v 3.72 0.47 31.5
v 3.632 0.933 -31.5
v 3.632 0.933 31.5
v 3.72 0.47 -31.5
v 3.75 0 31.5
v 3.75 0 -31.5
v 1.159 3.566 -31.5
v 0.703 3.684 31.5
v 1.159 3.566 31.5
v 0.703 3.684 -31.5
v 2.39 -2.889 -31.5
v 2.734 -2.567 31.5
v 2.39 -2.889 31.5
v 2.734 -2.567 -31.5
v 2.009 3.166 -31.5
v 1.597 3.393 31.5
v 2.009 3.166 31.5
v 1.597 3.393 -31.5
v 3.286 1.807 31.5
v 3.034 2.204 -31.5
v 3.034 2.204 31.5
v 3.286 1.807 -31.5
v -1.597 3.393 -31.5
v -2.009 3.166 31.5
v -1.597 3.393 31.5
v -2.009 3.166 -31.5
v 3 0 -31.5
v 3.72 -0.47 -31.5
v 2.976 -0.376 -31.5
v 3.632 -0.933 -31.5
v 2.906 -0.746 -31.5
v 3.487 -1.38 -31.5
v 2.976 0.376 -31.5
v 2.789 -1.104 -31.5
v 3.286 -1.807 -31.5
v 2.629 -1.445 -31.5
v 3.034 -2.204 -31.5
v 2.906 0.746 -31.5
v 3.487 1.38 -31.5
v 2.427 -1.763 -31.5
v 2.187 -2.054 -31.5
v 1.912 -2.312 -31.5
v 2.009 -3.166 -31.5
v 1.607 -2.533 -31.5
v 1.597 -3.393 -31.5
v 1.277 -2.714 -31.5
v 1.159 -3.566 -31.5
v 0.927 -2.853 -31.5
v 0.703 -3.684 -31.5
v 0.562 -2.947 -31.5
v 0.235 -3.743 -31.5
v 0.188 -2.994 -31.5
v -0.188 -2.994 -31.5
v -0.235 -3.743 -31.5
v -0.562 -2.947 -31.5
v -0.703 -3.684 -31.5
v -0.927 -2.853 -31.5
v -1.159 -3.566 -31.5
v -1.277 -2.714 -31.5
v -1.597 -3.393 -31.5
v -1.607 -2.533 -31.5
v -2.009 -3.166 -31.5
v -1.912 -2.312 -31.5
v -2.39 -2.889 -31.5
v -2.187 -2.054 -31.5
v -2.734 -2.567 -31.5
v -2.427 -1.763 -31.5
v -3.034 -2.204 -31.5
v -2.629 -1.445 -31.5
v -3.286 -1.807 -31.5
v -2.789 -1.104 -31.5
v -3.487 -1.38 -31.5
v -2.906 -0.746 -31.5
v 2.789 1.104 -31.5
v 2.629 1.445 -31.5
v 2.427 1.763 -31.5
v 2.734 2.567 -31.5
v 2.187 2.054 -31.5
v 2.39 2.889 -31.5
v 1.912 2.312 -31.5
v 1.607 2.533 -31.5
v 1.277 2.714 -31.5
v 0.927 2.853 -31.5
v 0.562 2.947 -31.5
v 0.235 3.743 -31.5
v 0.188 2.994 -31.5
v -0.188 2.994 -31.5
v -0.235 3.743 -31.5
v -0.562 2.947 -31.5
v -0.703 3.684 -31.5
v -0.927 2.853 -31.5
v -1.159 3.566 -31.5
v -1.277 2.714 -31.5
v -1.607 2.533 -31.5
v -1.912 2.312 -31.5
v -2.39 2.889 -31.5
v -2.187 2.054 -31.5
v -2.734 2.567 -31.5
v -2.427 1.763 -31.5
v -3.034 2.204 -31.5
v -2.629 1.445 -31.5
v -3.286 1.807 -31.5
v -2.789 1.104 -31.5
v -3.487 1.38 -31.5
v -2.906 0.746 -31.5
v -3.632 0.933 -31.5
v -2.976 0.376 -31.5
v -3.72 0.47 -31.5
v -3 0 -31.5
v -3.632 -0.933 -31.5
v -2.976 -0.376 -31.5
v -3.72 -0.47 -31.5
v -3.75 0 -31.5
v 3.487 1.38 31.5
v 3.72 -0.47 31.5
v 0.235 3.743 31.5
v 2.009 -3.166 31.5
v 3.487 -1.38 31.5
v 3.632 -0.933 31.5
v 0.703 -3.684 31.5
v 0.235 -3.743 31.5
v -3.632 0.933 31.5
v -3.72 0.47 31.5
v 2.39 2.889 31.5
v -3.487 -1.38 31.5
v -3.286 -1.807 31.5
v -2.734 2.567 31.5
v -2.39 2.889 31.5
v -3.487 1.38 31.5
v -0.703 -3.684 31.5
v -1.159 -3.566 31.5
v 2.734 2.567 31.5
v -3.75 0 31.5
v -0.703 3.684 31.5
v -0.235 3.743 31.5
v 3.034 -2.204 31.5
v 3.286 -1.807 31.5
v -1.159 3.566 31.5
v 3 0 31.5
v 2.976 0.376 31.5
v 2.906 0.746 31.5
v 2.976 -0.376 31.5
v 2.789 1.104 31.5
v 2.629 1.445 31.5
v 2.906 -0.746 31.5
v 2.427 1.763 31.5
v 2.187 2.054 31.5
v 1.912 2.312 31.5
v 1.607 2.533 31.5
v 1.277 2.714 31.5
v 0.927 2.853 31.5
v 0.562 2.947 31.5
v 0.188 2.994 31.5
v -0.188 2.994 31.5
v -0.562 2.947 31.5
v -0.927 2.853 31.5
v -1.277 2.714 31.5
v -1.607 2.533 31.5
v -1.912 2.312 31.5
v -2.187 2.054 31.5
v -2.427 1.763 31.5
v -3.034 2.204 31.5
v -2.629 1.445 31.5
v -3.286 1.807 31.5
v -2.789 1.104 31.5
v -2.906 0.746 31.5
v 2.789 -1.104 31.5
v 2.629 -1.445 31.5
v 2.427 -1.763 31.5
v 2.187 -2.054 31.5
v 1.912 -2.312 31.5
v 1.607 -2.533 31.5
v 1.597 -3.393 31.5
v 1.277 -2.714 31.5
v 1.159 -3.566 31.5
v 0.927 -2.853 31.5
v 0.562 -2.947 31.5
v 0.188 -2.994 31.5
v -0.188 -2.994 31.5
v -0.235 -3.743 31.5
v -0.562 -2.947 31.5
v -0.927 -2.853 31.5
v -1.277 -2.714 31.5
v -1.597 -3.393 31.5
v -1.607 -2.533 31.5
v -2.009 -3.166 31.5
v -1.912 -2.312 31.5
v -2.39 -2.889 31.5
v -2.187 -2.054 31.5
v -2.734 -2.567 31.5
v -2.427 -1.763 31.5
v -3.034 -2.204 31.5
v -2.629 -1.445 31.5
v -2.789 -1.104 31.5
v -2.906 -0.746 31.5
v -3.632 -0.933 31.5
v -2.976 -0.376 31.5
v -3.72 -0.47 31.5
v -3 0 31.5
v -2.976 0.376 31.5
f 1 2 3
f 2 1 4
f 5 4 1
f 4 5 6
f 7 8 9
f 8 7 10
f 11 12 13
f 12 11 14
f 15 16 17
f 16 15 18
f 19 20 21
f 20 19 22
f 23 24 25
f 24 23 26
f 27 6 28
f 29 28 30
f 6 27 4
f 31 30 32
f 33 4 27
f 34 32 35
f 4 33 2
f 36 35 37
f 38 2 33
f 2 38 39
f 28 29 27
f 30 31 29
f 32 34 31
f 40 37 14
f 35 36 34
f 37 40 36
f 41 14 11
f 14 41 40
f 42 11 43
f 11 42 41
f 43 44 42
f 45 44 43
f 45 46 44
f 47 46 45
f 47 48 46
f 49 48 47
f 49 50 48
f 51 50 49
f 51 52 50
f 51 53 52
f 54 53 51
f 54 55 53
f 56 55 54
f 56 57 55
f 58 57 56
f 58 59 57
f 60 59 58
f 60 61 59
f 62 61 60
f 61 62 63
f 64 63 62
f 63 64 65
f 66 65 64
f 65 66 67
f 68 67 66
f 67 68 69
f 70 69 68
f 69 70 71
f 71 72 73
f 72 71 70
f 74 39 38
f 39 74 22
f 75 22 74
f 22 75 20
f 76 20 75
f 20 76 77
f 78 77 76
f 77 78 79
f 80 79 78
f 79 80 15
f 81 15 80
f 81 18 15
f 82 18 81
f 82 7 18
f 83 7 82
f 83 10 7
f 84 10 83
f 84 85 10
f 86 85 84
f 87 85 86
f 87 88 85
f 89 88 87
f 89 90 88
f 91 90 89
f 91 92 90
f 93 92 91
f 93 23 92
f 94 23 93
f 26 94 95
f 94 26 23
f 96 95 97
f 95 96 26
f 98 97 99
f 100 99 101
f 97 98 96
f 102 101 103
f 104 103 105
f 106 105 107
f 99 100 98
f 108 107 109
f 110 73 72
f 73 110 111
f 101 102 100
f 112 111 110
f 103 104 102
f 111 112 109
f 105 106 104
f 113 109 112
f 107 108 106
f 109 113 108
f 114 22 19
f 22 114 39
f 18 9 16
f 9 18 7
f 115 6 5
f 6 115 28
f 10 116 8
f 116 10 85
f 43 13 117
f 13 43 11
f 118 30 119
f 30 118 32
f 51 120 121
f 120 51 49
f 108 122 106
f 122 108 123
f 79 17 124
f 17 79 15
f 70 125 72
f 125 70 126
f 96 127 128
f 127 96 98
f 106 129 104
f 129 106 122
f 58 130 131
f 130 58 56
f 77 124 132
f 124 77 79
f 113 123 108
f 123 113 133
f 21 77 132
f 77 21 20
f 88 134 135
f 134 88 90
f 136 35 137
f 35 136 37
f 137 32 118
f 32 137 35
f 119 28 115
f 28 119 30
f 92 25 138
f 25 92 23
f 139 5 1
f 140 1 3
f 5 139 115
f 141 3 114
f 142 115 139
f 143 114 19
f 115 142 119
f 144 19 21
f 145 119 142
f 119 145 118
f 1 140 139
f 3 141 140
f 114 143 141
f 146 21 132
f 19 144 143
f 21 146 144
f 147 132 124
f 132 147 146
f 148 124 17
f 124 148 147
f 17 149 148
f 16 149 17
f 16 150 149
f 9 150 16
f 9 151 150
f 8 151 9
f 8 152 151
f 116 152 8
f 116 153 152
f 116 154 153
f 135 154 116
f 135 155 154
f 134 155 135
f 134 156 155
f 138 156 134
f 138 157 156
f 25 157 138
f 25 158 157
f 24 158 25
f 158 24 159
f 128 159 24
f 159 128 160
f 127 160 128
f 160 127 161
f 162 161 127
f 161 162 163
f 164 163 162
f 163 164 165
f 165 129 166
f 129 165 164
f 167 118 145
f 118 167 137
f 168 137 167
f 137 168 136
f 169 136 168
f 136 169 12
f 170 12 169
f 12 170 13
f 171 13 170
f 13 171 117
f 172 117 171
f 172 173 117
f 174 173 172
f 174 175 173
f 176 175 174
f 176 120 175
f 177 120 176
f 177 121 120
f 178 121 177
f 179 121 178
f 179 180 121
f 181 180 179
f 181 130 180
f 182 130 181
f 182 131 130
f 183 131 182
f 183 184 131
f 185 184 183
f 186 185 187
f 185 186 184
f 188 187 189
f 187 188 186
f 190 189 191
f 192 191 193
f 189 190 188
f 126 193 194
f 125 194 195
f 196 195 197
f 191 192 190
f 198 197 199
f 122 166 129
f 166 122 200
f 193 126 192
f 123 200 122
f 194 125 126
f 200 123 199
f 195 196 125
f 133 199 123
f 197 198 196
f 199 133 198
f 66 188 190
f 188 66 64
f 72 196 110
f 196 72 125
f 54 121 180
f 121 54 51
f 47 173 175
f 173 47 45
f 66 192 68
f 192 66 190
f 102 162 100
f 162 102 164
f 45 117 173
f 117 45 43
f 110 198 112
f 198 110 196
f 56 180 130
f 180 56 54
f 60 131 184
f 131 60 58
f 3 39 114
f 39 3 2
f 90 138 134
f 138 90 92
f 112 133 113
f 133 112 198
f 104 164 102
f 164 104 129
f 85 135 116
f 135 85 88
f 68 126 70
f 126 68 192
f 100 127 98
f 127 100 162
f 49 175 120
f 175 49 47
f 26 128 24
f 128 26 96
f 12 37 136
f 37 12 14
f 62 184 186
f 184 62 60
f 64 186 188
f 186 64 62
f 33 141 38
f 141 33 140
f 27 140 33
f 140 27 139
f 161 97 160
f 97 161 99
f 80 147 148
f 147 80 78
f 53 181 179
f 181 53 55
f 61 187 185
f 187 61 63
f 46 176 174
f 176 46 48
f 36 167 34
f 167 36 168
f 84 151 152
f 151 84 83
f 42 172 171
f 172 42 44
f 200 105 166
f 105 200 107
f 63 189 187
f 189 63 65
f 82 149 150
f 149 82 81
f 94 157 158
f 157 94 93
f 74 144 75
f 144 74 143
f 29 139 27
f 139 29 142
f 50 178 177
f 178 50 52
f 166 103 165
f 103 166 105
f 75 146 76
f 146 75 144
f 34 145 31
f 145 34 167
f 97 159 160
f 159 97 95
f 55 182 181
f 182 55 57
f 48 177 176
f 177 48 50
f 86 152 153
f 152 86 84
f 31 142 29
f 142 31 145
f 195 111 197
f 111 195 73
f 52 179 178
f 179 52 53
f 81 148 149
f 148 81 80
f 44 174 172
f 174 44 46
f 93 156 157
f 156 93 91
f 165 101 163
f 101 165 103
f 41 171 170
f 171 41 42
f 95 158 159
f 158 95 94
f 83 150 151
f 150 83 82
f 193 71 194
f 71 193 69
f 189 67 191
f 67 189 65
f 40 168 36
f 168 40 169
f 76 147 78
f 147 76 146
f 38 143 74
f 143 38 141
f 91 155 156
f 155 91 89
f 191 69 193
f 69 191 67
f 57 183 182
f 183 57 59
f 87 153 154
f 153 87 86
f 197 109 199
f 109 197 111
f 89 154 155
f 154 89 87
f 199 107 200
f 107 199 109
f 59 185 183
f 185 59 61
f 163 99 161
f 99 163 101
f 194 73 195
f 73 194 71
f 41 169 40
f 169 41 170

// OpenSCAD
$fn = 50;


difference() {
	union() {
		translate(v = [0, 0, -31.5000000000]) {
			cylinder(h = 63, r = 3.7500000000);
		}
	}
	union() {
		translate(v = [0, 0, -100.0000000000]) {
			cylinder(h = 200, r = 3.0000000000);
		}
	}
}
